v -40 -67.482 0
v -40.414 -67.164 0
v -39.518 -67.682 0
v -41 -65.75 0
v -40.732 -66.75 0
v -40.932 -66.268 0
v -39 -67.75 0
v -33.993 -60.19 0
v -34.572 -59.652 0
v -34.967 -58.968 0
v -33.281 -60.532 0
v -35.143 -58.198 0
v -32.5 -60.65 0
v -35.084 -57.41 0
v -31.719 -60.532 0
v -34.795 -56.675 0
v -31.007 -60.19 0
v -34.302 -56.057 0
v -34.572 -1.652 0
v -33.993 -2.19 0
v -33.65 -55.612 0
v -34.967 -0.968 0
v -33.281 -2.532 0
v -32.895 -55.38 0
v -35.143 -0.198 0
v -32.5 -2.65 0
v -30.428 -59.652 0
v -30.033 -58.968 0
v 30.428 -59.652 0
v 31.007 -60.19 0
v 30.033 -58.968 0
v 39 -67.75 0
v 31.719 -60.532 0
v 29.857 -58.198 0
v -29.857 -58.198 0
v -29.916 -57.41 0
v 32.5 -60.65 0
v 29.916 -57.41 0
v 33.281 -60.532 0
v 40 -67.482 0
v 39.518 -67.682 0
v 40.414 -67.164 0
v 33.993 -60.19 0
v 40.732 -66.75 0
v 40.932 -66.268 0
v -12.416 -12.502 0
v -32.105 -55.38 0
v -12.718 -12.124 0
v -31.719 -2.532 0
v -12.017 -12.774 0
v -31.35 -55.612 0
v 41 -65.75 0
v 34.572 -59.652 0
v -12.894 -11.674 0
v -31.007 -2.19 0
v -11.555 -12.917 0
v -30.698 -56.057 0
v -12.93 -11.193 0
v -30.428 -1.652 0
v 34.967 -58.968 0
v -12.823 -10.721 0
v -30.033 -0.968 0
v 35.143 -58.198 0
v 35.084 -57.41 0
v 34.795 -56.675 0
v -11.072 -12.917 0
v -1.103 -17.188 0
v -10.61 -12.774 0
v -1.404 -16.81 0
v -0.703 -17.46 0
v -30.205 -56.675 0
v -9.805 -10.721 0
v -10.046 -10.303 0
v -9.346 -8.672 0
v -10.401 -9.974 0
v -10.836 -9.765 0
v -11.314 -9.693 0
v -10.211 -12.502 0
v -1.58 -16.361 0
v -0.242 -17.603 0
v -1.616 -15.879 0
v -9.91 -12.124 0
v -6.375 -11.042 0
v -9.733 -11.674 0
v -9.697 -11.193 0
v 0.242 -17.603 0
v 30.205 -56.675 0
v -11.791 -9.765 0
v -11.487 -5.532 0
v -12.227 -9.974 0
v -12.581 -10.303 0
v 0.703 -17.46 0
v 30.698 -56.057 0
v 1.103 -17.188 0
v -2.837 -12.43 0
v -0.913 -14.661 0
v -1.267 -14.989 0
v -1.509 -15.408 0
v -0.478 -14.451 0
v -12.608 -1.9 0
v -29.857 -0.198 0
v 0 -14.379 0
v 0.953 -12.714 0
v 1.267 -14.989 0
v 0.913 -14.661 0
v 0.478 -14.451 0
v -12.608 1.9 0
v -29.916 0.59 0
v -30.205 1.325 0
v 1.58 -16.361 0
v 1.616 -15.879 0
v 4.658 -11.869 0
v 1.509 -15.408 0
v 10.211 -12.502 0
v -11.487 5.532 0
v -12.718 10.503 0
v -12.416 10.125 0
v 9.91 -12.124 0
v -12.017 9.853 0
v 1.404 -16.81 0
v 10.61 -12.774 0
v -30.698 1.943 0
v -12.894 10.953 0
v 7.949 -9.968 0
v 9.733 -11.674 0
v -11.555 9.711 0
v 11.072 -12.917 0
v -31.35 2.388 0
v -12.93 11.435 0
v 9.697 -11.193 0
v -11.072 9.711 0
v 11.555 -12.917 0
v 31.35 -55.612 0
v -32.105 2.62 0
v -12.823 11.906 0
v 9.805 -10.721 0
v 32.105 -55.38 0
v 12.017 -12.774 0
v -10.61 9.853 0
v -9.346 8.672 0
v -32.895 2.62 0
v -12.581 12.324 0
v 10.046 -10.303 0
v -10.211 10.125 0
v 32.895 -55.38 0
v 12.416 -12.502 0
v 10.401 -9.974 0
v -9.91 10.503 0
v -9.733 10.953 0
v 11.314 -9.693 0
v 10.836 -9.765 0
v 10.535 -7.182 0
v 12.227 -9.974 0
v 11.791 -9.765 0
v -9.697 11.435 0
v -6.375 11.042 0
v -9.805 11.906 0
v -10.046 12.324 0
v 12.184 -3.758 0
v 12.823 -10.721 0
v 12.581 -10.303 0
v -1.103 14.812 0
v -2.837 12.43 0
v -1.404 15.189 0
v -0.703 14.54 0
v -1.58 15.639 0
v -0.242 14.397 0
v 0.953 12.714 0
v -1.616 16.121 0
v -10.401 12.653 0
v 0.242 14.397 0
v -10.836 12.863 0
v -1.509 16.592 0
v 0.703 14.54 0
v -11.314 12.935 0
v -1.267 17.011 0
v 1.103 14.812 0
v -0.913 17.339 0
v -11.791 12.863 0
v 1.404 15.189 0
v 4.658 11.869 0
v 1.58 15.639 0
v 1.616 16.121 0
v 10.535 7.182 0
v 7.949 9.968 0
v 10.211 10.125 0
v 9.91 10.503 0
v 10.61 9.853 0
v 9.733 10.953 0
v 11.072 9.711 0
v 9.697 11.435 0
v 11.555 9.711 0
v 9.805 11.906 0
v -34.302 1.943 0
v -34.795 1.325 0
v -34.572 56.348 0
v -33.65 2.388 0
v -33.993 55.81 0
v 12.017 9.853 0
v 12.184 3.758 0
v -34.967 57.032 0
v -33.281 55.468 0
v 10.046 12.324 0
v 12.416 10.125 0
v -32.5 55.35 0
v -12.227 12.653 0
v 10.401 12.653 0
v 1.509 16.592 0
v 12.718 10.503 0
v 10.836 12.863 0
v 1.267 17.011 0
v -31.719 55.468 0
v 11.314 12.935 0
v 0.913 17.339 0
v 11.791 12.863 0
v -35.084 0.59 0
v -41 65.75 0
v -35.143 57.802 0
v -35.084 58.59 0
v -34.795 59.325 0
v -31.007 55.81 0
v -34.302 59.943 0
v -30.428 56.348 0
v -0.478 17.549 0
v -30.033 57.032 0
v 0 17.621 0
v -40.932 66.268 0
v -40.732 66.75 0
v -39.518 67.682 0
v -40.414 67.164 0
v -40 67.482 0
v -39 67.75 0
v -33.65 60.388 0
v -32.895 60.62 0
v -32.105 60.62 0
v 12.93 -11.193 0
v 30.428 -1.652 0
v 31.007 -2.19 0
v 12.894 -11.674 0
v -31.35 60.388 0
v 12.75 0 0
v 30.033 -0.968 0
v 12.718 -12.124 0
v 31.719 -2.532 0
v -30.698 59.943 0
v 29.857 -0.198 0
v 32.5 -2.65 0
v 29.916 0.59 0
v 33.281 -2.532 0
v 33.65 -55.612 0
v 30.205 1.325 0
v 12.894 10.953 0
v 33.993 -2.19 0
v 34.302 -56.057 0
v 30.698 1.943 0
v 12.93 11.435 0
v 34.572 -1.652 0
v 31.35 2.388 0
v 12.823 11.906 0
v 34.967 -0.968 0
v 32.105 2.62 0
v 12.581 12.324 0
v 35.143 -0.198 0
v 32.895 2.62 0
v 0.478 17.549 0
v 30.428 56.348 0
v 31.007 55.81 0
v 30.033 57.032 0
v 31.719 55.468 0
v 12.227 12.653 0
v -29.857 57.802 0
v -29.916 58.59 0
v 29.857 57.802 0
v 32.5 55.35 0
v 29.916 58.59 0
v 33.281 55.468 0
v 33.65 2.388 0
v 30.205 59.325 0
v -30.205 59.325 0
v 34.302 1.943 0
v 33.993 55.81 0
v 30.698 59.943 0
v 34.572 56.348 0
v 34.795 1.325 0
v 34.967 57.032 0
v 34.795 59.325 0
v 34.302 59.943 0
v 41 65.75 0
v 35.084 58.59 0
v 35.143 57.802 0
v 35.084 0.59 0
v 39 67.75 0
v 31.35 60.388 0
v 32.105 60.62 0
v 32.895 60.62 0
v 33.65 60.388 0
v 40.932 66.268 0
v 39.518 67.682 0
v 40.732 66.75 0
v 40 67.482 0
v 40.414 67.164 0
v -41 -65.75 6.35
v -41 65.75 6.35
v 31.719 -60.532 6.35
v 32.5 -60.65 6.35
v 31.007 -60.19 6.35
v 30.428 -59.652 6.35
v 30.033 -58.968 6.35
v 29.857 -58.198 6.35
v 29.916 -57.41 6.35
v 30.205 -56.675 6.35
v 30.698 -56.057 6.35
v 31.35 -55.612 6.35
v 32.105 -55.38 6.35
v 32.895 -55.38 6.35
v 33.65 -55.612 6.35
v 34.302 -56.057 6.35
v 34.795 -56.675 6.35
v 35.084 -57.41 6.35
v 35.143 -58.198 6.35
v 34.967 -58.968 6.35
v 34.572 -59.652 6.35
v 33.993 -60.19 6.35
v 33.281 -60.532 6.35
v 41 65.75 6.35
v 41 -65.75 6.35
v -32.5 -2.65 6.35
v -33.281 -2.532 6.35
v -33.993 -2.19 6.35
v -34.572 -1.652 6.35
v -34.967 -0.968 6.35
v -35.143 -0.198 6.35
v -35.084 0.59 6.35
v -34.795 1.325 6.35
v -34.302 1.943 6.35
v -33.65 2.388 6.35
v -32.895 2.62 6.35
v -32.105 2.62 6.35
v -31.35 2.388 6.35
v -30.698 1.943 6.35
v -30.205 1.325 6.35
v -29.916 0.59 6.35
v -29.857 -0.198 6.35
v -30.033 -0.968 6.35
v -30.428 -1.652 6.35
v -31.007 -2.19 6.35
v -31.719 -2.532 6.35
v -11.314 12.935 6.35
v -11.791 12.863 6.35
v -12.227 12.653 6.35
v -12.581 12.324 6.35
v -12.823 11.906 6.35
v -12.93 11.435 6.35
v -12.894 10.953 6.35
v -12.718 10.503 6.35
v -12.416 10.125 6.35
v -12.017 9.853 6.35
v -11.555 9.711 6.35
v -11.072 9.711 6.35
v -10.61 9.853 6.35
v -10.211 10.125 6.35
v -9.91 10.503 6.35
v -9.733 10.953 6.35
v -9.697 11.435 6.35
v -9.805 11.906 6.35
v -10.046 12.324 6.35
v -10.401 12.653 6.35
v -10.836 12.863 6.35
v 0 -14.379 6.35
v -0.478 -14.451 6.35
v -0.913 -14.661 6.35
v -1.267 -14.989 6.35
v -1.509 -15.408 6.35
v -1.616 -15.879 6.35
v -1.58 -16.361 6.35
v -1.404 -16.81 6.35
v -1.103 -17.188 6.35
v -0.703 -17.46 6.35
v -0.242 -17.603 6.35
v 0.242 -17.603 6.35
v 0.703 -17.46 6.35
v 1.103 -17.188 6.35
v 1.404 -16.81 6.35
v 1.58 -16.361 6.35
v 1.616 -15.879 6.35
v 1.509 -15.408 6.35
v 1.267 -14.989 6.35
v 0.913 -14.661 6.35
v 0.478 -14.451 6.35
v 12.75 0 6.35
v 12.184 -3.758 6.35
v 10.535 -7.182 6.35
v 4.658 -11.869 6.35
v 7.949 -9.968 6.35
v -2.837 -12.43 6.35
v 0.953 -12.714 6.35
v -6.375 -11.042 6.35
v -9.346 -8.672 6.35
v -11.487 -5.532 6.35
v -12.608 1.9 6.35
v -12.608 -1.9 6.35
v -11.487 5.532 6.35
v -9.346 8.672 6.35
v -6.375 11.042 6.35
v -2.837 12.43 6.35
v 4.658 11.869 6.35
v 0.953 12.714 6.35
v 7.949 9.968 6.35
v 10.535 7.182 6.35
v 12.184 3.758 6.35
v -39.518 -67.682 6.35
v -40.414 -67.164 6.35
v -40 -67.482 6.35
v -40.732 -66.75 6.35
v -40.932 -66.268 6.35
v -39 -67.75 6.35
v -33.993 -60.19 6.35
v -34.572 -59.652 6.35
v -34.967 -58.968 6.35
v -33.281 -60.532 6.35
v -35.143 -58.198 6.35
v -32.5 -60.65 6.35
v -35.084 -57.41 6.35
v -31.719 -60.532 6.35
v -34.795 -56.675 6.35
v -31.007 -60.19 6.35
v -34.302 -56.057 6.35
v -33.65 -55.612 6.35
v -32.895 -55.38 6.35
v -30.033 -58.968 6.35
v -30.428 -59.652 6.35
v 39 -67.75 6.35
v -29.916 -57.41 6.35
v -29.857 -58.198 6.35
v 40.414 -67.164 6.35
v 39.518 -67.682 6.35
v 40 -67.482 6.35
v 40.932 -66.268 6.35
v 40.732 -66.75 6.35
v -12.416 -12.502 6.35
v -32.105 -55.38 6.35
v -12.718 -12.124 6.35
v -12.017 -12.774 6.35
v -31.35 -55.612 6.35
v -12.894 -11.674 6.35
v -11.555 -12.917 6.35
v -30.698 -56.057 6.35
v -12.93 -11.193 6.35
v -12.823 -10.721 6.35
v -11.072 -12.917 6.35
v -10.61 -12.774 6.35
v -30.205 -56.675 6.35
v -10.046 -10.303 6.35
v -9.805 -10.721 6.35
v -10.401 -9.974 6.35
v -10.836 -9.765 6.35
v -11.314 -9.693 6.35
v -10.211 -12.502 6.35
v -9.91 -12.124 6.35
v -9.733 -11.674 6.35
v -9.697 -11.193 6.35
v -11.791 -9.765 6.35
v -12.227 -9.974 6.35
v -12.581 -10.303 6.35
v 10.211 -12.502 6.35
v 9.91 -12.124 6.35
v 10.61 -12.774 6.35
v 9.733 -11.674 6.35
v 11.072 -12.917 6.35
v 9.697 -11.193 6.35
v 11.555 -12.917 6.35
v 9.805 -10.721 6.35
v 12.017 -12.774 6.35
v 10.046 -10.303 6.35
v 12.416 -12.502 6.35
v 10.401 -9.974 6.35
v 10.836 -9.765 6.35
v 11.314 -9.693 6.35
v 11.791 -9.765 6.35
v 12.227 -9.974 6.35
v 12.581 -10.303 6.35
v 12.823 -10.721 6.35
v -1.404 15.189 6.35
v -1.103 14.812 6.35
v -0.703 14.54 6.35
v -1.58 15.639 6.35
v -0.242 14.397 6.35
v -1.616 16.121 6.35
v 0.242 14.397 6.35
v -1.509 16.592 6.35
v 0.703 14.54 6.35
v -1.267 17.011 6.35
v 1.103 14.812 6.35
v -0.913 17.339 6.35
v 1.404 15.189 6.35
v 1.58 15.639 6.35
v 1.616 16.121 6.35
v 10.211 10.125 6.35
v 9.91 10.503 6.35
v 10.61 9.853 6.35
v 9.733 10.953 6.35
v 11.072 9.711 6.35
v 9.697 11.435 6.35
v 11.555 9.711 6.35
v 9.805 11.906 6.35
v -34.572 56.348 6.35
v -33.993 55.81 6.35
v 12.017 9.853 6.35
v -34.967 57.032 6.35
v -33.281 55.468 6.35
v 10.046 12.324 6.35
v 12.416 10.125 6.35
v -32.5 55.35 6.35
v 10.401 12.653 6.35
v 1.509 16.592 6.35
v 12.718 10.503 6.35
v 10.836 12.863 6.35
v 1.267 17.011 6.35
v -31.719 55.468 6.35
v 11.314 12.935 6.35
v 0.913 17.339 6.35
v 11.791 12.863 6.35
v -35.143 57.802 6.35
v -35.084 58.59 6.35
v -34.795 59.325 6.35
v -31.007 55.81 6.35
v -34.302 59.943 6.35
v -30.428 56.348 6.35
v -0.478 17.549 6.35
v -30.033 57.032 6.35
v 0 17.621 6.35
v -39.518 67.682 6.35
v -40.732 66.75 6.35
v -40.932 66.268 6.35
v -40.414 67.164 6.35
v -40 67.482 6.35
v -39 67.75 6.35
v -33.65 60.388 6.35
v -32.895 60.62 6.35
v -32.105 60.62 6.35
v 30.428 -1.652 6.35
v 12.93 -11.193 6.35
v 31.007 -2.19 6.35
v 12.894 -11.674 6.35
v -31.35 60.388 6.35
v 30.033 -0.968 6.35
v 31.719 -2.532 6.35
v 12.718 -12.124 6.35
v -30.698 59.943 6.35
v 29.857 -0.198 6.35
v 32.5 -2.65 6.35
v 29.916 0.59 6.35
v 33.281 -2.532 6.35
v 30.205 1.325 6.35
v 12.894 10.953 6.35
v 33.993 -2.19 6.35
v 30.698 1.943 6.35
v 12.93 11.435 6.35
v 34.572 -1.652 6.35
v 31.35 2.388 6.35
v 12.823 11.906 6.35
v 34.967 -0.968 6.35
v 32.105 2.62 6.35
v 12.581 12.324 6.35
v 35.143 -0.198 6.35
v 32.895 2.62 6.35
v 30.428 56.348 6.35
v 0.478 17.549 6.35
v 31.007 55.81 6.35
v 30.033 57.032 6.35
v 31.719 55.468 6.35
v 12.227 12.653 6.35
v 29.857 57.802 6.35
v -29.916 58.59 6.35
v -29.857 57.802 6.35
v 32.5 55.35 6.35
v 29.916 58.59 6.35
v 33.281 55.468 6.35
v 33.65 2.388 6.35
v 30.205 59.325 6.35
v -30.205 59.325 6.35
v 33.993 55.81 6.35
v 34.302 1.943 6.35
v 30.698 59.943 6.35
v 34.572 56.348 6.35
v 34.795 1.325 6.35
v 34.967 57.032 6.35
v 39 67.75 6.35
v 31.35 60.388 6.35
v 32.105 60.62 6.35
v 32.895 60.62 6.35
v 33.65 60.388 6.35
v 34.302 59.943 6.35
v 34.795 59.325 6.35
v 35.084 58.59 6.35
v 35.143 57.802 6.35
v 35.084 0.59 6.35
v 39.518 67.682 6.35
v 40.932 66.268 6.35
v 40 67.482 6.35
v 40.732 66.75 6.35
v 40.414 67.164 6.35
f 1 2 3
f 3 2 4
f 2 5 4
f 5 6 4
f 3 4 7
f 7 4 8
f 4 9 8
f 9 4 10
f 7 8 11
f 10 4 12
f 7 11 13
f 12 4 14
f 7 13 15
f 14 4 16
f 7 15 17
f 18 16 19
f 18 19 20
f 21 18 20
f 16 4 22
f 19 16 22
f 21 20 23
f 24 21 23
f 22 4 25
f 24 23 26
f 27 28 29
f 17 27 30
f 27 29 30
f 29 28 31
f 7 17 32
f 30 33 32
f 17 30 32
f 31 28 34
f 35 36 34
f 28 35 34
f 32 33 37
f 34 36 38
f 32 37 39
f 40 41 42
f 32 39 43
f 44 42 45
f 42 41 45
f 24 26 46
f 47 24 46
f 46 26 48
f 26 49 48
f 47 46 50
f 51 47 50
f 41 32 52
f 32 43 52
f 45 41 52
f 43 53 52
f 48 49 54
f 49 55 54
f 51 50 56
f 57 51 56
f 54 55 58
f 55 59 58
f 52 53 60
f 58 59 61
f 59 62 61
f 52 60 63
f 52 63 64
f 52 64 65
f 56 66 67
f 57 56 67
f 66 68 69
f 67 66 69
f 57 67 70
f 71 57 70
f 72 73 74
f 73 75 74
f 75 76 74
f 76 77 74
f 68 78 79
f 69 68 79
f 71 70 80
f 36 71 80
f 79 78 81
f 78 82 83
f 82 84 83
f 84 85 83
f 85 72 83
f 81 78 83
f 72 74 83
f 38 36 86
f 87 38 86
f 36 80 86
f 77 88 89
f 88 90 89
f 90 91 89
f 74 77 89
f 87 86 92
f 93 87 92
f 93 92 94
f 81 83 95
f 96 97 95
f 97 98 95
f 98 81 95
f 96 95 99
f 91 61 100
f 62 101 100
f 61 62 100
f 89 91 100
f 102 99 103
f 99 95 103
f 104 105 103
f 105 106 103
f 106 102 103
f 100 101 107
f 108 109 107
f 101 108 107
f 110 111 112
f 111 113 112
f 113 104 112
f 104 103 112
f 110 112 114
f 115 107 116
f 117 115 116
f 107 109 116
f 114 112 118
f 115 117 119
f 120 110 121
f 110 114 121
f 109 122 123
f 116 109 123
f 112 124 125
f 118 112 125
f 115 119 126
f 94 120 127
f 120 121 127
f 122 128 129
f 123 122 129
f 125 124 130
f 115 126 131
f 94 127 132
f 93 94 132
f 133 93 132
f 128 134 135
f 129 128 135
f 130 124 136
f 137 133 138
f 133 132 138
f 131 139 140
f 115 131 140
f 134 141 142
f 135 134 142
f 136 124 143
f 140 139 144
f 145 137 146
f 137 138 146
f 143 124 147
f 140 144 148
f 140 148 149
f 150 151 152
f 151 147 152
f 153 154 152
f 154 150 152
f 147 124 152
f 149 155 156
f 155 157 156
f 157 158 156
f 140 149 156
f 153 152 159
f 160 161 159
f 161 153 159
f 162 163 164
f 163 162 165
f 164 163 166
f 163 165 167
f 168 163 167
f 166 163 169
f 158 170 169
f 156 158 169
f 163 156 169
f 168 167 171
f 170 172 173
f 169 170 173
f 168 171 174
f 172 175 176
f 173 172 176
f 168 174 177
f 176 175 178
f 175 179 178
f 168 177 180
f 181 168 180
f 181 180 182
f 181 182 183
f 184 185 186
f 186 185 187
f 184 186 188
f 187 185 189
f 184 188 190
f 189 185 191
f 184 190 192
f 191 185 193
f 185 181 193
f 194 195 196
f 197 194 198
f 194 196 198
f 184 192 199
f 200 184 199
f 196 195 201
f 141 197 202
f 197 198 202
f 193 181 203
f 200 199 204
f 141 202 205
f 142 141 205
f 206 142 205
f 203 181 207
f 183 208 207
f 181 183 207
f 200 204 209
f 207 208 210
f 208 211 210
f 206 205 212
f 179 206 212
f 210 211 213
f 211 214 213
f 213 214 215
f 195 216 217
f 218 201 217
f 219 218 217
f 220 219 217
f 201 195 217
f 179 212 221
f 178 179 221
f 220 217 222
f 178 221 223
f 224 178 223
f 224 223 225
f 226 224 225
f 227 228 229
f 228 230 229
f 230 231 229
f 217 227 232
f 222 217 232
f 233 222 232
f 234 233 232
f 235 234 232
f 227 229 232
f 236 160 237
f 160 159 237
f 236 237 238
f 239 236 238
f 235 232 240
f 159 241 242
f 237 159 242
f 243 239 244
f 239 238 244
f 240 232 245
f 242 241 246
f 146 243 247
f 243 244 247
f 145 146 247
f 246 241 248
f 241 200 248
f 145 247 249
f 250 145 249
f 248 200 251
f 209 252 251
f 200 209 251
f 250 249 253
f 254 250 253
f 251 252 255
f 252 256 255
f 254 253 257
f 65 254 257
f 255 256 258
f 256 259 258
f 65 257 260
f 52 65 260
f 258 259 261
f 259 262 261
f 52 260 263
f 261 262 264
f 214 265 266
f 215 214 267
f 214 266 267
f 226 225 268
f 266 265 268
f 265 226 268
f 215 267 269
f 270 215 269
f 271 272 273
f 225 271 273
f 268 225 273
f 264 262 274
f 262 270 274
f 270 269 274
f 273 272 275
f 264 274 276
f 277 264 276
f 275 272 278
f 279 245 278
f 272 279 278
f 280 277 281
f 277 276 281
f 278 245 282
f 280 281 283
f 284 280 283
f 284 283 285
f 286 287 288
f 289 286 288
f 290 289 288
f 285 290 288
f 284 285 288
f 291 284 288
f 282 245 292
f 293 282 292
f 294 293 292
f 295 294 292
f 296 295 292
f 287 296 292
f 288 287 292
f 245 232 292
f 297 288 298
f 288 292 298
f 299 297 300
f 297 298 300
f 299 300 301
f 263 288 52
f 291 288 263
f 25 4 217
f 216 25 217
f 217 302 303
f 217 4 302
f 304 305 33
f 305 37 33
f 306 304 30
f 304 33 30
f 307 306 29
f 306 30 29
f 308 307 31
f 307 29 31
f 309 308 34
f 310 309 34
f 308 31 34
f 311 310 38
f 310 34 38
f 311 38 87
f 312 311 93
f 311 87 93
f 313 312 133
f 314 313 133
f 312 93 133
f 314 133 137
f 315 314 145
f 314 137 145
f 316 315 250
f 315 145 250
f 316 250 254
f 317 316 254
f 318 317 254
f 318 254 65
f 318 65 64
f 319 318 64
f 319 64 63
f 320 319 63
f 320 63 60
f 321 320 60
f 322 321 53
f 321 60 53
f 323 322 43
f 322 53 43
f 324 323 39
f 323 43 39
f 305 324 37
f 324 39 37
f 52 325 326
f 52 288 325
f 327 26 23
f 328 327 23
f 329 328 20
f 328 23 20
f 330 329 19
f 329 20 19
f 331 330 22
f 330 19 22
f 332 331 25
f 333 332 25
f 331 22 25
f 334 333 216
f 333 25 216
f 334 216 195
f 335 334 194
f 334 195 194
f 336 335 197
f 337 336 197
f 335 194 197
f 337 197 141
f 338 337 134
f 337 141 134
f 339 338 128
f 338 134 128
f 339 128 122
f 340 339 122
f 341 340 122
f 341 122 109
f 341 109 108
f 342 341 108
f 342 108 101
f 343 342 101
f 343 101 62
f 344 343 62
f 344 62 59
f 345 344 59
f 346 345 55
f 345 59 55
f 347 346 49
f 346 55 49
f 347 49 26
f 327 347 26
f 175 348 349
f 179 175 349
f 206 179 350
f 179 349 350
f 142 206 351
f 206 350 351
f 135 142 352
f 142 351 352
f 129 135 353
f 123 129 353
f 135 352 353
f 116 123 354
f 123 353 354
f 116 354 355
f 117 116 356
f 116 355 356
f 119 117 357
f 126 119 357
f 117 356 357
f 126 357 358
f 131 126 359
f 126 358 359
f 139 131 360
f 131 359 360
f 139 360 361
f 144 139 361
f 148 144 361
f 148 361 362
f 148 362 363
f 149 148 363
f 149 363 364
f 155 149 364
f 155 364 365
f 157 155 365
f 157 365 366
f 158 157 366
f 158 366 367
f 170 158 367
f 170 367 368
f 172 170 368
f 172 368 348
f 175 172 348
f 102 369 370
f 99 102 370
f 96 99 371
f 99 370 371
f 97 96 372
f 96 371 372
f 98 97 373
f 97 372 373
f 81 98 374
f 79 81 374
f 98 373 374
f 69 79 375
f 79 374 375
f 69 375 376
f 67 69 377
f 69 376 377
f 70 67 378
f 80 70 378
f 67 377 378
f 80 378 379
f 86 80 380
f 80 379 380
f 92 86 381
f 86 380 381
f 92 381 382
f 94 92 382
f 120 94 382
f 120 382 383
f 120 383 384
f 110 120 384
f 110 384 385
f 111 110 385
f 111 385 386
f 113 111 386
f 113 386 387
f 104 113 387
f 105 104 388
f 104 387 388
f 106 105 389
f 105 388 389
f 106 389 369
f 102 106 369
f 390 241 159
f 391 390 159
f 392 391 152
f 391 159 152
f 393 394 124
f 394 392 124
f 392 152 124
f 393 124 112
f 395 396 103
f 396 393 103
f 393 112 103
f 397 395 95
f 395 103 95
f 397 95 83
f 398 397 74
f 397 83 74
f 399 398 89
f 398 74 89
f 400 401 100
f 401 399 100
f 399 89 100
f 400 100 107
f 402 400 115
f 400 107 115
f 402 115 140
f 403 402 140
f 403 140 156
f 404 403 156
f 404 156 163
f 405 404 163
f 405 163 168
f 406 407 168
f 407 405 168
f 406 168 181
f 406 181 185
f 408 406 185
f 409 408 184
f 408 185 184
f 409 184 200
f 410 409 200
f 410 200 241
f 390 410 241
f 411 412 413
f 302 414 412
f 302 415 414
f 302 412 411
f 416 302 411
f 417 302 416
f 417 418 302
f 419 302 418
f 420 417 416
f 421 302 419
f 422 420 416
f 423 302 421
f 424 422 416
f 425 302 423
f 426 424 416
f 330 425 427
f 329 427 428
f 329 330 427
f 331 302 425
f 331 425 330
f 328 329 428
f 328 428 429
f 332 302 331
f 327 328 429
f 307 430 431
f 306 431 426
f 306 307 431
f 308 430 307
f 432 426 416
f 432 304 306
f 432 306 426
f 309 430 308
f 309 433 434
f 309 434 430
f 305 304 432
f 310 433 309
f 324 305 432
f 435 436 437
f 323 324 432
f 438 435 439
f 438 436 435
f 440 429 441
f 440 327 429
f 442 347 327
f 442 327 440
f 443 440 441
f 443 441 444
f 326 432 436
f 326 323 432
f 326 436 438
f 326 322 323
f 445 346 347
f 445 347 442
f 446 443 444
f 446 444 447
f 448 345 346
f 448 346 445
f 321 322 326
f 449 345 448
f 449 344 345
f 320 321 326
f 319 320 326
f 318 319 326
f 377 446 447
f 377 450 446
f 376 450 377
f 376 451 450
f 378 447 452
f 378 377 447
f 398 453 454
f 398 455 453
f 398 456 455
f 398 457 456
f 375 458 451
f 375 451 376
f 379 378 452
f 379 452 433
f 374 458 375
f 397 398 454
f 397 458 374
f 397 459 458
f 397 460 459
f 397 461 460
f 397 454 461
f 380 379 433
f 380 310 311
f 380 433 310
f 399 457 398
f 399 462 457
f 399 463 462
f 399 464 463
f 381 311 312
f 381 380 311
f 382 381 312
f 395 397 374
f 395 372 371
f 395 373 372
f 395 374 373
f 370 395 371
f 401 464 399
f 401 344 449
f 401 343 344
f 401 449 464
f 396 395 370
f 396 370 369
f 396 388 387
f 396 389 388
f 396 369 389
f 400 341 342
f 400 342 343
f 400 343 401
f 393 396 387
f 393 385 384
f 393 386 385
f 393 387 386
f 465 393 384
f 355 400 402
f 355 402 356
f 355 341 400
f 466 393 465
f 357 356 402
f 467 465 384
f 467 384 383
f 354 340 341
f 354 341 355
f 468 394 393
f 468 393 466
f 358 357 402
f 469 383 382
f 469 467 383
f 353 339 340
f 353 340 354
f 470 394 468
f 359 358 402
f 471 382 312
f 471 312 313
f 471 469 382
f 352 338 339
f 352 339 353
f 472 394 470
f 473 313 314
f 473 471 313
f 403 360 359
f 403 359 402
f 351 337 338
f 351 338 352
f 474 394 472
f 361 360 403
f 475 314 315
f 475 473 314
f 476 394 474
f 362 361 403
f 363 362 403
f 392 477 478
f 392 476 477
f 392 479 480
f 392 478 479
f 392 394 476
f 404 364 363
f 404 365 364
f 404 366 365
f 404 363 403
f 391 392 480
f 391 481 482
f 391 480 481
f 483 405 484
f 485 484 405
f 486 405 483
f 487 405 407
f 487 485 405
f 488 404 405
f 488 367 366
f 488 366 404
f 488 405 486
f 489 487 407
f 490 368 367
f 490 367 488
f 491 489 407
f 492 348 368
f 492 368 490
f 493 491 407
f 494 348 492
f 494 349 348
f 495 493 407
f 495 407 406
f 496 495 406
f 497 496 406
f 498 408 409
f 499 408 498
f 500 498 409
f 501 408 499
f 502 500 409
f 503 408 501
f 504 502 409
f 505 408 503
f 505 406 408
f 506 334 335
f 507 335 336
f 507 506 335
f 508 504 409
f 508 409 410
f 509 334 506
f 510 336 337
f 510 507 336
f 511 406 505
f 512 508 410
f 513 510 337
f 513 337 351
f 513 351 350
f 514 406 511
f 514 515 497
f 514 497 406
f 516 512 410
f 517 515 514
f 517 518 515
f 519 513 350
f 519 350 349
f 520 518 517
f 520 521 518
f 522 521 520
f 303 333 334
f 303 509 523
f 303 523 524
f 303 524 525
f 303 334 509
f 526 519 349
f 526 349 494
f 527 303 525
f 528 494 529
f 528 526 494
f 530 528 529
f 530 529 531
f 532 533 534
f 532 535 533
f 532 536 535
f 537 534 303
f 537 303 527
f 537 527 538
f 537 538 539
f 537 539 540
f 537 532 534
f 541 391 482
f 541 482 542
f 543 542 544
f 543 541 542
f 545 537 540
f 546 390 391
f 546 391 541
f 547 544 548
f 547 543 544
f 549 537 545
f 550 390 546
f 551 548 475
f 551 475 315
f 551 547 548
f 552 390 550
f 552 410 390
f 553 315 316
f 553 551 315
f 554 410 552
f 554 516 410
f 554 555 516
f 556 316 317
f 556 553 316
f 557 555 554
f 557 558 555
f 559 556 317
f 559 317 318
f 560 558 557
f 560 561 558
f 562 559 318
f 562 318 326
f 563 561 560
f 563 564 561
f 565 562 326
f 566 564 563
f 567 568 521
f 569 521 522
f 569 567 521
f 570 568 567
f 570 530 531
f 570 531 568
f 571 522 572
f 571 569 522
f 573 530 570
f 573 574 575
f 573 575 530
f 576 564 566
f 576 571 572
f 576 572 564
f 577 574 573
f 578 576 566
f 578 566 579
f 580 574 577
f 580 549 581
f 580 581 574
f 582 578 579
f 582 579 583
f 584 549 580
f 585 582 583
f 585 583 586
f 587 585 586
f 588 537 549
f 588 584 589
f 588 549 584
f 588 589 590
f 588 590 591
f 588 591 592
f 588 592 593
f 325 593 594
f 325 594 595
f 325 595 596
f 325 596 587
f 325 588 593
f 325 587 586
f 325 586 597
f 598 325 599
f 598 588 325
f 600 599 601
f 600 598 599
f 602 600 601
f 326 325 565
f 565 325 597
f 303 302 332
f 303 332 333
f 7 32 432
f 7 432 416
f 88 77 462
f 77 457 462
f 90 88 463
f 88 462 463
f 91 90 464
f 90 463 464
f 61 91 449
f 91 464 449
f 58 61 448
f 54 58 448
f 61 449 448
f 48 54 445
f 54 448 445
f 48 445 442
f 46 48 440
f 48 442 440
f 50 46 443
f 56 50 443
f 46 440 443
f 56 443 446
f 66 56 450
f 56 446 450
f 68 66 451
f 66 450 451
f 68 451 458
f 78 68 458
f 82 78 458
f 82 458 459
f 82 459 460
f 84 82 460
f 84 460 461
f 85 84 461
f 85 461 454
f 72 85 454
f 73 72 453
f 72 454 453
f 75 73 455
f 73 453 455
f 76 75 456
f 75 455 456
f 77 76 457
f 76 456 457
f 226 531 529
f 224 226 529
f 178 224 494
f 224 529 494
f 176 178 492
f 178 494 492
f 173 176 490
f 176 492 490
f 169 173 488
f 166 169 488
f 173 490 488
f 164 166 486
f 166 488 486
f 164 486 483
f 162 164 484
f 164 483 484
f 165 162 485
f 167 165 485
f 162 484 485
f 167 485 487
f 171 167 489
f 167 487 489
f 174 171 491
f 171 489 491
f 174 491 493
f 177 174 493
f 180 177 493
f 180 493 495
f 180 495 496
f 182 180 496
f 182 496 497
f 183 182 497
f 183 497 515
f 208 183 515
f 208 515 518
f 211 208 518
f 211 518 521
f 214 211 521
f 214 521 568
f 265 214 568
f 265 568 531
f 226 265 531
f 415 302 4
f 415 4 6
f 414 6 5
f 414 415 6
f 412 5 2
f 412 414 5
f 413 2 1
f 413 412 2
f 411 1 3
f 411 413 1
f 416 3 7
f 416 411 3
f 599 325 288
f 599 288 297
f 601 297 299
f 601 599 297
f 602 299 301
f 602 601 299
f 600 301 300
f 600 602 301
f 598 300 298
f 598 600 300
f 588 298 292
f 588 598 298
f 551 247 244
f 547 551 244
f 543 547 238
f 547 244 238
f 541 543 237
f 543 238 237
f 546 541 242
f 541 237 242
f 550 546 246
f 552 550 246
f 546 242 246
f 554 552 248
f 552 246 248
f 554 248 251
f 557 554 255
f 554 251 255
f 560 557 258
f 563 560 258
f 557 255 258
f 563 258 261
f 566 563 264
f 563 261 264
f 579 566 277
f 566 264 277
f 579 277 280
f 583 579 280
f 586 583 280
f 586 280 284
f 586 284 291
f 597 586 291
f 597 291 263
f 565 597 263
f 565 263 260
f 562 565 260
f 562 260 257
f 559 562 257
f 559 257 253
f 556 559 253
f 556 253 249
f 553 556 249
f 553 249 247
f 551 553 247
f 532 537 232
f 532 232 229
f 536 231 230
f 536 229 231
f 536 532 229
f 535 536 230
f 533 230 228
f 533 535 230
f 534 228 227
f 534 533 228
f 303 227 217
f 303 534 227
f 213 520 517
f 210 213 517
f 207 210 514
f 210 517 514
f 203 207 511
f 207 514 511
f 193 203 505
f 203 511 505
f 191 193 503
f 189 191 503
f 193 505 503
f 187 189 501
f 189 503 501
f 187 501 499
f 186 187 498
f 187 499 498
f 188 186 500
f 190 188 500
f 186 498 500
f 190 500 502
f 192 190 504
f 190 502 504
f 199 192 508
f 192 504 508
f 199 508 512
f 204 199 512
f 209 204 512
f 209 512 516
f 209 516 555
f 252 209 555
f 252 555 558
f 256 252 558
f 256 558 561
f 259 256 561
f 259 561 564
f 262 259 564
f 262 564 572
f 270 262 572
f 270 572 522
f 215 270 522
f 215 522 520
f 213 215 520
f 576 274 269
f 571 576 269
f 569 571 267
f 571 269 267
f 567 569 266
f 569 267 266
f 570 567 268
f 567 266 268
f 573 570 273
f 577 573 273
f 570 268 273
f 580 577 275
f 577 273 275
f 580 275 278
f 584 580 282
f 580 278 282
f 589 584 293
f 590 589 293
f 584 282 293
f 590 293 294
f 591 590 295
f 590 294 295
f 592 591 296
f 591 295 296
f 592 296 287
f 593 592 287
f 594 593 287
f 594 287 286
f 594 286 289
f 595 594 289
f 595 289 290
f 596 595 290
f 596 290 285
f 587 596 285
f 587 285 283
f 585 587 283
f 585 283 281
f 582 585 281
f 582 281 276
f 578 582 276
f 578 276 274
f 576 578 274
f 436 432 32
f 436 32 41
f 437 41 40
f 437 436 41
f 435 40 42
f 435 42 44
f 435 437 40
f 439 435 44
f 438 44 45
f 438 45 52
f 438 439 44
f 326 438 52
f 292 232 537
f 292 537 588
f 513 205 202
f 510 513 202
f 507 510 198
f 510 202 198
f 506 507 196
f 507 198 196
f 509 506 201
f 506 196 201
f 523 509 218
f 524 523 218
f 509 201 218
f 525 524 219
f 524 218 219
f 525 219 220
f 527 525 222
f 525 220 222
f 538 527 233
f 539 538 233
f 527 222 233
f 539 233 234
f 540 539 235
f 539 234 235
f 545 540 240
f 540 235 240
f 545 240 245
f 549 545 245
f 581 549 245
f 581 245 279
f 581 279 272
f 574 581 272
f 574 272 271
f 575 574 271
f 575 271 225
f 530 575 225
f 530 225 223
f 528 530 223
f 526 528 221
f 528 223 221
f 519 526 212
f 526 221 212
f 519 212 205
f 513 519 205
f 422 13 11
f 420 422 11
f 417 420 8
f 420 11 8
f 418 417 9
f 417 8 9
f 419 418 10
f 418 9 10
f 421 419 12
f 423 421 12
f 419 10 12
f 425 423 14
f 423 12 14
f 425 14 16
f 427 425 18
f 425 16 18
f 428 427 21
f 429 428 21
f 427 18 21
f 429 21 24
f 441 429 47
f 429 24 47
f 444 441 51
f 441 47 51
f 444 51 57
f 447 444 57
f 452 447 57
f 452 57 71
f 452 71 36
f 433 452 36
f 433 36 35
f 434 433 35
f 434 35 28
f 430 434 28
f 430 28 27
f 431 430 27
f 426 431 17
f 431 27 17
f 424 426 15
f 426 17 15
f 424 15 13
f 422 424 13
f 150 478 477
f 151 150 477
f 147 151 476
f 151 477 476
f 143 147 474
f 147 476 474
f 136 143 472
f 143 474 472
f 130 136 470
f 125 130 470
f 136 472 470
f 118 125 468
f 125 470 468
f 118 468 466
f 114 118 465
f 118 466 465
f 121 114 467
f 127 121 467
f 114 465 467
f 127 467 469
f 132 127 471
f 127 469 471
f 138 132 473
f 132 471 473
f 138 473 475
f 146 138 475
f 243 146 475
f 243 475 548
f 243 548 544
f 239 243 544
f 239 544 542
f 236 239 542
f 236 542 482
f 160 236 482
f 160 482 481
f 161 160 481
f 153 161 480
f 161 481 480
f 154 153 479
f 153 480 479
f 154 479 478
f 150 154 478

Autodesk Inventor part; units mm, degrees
ref_plane "XY Plane" through (0, 0, 0) normal (0, 0, 1) x (1, 0, 0)
sketch "Sketch1" plane through (0, 0, 0) normal (0, 0, 1) x (1, 0, 0)
  line L0 (41, -67.75) -> (-41, -67.75)
  line L1 (-41, -67.75) -> (-41, 67.75)
  line L2 (-41, 67.75) -> (41, 67.75)
  line L3 (41, 67.75) -> (41, -67.75)
  line L4 (41, -67.75) -> (-41, 67.75) construction
  line L5 (-41, -67.75) -> (41, 67.75) construction
  circle A0 centre (0, 0) radius 12.75
  line L6 (11.3137, -11.3137) -> (-11.3137, -11.3137) construction
  line L7 (-11.3137, -11.3137) -> (-11.3137, 11.3137) construction
  line L8 (-11.3137, 11.3137) -> (11.3137, 11.3137) construction
  line L9 (11.3137, 11.3137) -> (11.3137, -11.3137) construction
  line L10 (11.3137, -11.3137) -> (-11.3137, 11.3137) construction
  line L11 (-11.3137, -11.3137) -> (11.3137, 11.3137) construction
  circle A1 centre (0, 0) radius 16 construction
  line L12 (0, 16) -> (0, -16) construction
  dimension "d0" = 82
  dimension "d1" = 135.5
  dimension "d2" = 25.5
  dimension "d3" = 32
  dimension "d4" = 0
extrude "Extrusion1" add sketch "Sketch1" along normal blind 6.35
hole "Hole1" at (0, 16, 0) at (11.3137, 11.3137, 0) at (-11.3137, 11.3137, 0) at (11.3137, -11.3137, 0) at (0, -16, 0) at (-11.3137, -11.3137, 0) direction (0, 0, 1) diameter 3.242 end through all thread size "M4x0.7" class "6H" standard "ANSI Metric M Profile"
fillet "Fillet1" radius 2 4 edges at (41, 67.75, 3.175) (-41, 67.75, 3.175) (-41, -67.75, 3.175) (41, -67.75, 3.175)
sketch "Sketch2" plane through (0, 0, 6.35) normal (0, 0, 1) x (1, 0, 0)
  line L0 (32.5, -58) -> (-32.5, -58) construction
  line L1 (-32.5, -58) -> (-32.5, 58) construction
  line L2 (-32.5, 58) -> (32.5, 58) construction
  line L3 (32.5, 58) -> (32.5, -58) construction
  line L4 (32.5, -58) -> (-32.5, 58) construction
  line L5 (-32.5, -58) -> (32.5, 58) construction
  point P0 (0, 0)
  point P1 (32.5, 0)
  point P2 (-32.5, 0)
  dimension "d15" = 65
  dimension "d16" = 116
hole "Hole2" at (-32.5, 58, 6.35) at (32.5, 58, 6.35) at (32.5, 0, 6.35) at (32.5, -58, 6.35) at (-32.5, -58, 6.35) at (-32.5, 0, 6.35) direction (0, 0, -1) diameter 5.3 end through all
properties part number "Z-Axis Nut Plate" material "Aluminum 6061"
